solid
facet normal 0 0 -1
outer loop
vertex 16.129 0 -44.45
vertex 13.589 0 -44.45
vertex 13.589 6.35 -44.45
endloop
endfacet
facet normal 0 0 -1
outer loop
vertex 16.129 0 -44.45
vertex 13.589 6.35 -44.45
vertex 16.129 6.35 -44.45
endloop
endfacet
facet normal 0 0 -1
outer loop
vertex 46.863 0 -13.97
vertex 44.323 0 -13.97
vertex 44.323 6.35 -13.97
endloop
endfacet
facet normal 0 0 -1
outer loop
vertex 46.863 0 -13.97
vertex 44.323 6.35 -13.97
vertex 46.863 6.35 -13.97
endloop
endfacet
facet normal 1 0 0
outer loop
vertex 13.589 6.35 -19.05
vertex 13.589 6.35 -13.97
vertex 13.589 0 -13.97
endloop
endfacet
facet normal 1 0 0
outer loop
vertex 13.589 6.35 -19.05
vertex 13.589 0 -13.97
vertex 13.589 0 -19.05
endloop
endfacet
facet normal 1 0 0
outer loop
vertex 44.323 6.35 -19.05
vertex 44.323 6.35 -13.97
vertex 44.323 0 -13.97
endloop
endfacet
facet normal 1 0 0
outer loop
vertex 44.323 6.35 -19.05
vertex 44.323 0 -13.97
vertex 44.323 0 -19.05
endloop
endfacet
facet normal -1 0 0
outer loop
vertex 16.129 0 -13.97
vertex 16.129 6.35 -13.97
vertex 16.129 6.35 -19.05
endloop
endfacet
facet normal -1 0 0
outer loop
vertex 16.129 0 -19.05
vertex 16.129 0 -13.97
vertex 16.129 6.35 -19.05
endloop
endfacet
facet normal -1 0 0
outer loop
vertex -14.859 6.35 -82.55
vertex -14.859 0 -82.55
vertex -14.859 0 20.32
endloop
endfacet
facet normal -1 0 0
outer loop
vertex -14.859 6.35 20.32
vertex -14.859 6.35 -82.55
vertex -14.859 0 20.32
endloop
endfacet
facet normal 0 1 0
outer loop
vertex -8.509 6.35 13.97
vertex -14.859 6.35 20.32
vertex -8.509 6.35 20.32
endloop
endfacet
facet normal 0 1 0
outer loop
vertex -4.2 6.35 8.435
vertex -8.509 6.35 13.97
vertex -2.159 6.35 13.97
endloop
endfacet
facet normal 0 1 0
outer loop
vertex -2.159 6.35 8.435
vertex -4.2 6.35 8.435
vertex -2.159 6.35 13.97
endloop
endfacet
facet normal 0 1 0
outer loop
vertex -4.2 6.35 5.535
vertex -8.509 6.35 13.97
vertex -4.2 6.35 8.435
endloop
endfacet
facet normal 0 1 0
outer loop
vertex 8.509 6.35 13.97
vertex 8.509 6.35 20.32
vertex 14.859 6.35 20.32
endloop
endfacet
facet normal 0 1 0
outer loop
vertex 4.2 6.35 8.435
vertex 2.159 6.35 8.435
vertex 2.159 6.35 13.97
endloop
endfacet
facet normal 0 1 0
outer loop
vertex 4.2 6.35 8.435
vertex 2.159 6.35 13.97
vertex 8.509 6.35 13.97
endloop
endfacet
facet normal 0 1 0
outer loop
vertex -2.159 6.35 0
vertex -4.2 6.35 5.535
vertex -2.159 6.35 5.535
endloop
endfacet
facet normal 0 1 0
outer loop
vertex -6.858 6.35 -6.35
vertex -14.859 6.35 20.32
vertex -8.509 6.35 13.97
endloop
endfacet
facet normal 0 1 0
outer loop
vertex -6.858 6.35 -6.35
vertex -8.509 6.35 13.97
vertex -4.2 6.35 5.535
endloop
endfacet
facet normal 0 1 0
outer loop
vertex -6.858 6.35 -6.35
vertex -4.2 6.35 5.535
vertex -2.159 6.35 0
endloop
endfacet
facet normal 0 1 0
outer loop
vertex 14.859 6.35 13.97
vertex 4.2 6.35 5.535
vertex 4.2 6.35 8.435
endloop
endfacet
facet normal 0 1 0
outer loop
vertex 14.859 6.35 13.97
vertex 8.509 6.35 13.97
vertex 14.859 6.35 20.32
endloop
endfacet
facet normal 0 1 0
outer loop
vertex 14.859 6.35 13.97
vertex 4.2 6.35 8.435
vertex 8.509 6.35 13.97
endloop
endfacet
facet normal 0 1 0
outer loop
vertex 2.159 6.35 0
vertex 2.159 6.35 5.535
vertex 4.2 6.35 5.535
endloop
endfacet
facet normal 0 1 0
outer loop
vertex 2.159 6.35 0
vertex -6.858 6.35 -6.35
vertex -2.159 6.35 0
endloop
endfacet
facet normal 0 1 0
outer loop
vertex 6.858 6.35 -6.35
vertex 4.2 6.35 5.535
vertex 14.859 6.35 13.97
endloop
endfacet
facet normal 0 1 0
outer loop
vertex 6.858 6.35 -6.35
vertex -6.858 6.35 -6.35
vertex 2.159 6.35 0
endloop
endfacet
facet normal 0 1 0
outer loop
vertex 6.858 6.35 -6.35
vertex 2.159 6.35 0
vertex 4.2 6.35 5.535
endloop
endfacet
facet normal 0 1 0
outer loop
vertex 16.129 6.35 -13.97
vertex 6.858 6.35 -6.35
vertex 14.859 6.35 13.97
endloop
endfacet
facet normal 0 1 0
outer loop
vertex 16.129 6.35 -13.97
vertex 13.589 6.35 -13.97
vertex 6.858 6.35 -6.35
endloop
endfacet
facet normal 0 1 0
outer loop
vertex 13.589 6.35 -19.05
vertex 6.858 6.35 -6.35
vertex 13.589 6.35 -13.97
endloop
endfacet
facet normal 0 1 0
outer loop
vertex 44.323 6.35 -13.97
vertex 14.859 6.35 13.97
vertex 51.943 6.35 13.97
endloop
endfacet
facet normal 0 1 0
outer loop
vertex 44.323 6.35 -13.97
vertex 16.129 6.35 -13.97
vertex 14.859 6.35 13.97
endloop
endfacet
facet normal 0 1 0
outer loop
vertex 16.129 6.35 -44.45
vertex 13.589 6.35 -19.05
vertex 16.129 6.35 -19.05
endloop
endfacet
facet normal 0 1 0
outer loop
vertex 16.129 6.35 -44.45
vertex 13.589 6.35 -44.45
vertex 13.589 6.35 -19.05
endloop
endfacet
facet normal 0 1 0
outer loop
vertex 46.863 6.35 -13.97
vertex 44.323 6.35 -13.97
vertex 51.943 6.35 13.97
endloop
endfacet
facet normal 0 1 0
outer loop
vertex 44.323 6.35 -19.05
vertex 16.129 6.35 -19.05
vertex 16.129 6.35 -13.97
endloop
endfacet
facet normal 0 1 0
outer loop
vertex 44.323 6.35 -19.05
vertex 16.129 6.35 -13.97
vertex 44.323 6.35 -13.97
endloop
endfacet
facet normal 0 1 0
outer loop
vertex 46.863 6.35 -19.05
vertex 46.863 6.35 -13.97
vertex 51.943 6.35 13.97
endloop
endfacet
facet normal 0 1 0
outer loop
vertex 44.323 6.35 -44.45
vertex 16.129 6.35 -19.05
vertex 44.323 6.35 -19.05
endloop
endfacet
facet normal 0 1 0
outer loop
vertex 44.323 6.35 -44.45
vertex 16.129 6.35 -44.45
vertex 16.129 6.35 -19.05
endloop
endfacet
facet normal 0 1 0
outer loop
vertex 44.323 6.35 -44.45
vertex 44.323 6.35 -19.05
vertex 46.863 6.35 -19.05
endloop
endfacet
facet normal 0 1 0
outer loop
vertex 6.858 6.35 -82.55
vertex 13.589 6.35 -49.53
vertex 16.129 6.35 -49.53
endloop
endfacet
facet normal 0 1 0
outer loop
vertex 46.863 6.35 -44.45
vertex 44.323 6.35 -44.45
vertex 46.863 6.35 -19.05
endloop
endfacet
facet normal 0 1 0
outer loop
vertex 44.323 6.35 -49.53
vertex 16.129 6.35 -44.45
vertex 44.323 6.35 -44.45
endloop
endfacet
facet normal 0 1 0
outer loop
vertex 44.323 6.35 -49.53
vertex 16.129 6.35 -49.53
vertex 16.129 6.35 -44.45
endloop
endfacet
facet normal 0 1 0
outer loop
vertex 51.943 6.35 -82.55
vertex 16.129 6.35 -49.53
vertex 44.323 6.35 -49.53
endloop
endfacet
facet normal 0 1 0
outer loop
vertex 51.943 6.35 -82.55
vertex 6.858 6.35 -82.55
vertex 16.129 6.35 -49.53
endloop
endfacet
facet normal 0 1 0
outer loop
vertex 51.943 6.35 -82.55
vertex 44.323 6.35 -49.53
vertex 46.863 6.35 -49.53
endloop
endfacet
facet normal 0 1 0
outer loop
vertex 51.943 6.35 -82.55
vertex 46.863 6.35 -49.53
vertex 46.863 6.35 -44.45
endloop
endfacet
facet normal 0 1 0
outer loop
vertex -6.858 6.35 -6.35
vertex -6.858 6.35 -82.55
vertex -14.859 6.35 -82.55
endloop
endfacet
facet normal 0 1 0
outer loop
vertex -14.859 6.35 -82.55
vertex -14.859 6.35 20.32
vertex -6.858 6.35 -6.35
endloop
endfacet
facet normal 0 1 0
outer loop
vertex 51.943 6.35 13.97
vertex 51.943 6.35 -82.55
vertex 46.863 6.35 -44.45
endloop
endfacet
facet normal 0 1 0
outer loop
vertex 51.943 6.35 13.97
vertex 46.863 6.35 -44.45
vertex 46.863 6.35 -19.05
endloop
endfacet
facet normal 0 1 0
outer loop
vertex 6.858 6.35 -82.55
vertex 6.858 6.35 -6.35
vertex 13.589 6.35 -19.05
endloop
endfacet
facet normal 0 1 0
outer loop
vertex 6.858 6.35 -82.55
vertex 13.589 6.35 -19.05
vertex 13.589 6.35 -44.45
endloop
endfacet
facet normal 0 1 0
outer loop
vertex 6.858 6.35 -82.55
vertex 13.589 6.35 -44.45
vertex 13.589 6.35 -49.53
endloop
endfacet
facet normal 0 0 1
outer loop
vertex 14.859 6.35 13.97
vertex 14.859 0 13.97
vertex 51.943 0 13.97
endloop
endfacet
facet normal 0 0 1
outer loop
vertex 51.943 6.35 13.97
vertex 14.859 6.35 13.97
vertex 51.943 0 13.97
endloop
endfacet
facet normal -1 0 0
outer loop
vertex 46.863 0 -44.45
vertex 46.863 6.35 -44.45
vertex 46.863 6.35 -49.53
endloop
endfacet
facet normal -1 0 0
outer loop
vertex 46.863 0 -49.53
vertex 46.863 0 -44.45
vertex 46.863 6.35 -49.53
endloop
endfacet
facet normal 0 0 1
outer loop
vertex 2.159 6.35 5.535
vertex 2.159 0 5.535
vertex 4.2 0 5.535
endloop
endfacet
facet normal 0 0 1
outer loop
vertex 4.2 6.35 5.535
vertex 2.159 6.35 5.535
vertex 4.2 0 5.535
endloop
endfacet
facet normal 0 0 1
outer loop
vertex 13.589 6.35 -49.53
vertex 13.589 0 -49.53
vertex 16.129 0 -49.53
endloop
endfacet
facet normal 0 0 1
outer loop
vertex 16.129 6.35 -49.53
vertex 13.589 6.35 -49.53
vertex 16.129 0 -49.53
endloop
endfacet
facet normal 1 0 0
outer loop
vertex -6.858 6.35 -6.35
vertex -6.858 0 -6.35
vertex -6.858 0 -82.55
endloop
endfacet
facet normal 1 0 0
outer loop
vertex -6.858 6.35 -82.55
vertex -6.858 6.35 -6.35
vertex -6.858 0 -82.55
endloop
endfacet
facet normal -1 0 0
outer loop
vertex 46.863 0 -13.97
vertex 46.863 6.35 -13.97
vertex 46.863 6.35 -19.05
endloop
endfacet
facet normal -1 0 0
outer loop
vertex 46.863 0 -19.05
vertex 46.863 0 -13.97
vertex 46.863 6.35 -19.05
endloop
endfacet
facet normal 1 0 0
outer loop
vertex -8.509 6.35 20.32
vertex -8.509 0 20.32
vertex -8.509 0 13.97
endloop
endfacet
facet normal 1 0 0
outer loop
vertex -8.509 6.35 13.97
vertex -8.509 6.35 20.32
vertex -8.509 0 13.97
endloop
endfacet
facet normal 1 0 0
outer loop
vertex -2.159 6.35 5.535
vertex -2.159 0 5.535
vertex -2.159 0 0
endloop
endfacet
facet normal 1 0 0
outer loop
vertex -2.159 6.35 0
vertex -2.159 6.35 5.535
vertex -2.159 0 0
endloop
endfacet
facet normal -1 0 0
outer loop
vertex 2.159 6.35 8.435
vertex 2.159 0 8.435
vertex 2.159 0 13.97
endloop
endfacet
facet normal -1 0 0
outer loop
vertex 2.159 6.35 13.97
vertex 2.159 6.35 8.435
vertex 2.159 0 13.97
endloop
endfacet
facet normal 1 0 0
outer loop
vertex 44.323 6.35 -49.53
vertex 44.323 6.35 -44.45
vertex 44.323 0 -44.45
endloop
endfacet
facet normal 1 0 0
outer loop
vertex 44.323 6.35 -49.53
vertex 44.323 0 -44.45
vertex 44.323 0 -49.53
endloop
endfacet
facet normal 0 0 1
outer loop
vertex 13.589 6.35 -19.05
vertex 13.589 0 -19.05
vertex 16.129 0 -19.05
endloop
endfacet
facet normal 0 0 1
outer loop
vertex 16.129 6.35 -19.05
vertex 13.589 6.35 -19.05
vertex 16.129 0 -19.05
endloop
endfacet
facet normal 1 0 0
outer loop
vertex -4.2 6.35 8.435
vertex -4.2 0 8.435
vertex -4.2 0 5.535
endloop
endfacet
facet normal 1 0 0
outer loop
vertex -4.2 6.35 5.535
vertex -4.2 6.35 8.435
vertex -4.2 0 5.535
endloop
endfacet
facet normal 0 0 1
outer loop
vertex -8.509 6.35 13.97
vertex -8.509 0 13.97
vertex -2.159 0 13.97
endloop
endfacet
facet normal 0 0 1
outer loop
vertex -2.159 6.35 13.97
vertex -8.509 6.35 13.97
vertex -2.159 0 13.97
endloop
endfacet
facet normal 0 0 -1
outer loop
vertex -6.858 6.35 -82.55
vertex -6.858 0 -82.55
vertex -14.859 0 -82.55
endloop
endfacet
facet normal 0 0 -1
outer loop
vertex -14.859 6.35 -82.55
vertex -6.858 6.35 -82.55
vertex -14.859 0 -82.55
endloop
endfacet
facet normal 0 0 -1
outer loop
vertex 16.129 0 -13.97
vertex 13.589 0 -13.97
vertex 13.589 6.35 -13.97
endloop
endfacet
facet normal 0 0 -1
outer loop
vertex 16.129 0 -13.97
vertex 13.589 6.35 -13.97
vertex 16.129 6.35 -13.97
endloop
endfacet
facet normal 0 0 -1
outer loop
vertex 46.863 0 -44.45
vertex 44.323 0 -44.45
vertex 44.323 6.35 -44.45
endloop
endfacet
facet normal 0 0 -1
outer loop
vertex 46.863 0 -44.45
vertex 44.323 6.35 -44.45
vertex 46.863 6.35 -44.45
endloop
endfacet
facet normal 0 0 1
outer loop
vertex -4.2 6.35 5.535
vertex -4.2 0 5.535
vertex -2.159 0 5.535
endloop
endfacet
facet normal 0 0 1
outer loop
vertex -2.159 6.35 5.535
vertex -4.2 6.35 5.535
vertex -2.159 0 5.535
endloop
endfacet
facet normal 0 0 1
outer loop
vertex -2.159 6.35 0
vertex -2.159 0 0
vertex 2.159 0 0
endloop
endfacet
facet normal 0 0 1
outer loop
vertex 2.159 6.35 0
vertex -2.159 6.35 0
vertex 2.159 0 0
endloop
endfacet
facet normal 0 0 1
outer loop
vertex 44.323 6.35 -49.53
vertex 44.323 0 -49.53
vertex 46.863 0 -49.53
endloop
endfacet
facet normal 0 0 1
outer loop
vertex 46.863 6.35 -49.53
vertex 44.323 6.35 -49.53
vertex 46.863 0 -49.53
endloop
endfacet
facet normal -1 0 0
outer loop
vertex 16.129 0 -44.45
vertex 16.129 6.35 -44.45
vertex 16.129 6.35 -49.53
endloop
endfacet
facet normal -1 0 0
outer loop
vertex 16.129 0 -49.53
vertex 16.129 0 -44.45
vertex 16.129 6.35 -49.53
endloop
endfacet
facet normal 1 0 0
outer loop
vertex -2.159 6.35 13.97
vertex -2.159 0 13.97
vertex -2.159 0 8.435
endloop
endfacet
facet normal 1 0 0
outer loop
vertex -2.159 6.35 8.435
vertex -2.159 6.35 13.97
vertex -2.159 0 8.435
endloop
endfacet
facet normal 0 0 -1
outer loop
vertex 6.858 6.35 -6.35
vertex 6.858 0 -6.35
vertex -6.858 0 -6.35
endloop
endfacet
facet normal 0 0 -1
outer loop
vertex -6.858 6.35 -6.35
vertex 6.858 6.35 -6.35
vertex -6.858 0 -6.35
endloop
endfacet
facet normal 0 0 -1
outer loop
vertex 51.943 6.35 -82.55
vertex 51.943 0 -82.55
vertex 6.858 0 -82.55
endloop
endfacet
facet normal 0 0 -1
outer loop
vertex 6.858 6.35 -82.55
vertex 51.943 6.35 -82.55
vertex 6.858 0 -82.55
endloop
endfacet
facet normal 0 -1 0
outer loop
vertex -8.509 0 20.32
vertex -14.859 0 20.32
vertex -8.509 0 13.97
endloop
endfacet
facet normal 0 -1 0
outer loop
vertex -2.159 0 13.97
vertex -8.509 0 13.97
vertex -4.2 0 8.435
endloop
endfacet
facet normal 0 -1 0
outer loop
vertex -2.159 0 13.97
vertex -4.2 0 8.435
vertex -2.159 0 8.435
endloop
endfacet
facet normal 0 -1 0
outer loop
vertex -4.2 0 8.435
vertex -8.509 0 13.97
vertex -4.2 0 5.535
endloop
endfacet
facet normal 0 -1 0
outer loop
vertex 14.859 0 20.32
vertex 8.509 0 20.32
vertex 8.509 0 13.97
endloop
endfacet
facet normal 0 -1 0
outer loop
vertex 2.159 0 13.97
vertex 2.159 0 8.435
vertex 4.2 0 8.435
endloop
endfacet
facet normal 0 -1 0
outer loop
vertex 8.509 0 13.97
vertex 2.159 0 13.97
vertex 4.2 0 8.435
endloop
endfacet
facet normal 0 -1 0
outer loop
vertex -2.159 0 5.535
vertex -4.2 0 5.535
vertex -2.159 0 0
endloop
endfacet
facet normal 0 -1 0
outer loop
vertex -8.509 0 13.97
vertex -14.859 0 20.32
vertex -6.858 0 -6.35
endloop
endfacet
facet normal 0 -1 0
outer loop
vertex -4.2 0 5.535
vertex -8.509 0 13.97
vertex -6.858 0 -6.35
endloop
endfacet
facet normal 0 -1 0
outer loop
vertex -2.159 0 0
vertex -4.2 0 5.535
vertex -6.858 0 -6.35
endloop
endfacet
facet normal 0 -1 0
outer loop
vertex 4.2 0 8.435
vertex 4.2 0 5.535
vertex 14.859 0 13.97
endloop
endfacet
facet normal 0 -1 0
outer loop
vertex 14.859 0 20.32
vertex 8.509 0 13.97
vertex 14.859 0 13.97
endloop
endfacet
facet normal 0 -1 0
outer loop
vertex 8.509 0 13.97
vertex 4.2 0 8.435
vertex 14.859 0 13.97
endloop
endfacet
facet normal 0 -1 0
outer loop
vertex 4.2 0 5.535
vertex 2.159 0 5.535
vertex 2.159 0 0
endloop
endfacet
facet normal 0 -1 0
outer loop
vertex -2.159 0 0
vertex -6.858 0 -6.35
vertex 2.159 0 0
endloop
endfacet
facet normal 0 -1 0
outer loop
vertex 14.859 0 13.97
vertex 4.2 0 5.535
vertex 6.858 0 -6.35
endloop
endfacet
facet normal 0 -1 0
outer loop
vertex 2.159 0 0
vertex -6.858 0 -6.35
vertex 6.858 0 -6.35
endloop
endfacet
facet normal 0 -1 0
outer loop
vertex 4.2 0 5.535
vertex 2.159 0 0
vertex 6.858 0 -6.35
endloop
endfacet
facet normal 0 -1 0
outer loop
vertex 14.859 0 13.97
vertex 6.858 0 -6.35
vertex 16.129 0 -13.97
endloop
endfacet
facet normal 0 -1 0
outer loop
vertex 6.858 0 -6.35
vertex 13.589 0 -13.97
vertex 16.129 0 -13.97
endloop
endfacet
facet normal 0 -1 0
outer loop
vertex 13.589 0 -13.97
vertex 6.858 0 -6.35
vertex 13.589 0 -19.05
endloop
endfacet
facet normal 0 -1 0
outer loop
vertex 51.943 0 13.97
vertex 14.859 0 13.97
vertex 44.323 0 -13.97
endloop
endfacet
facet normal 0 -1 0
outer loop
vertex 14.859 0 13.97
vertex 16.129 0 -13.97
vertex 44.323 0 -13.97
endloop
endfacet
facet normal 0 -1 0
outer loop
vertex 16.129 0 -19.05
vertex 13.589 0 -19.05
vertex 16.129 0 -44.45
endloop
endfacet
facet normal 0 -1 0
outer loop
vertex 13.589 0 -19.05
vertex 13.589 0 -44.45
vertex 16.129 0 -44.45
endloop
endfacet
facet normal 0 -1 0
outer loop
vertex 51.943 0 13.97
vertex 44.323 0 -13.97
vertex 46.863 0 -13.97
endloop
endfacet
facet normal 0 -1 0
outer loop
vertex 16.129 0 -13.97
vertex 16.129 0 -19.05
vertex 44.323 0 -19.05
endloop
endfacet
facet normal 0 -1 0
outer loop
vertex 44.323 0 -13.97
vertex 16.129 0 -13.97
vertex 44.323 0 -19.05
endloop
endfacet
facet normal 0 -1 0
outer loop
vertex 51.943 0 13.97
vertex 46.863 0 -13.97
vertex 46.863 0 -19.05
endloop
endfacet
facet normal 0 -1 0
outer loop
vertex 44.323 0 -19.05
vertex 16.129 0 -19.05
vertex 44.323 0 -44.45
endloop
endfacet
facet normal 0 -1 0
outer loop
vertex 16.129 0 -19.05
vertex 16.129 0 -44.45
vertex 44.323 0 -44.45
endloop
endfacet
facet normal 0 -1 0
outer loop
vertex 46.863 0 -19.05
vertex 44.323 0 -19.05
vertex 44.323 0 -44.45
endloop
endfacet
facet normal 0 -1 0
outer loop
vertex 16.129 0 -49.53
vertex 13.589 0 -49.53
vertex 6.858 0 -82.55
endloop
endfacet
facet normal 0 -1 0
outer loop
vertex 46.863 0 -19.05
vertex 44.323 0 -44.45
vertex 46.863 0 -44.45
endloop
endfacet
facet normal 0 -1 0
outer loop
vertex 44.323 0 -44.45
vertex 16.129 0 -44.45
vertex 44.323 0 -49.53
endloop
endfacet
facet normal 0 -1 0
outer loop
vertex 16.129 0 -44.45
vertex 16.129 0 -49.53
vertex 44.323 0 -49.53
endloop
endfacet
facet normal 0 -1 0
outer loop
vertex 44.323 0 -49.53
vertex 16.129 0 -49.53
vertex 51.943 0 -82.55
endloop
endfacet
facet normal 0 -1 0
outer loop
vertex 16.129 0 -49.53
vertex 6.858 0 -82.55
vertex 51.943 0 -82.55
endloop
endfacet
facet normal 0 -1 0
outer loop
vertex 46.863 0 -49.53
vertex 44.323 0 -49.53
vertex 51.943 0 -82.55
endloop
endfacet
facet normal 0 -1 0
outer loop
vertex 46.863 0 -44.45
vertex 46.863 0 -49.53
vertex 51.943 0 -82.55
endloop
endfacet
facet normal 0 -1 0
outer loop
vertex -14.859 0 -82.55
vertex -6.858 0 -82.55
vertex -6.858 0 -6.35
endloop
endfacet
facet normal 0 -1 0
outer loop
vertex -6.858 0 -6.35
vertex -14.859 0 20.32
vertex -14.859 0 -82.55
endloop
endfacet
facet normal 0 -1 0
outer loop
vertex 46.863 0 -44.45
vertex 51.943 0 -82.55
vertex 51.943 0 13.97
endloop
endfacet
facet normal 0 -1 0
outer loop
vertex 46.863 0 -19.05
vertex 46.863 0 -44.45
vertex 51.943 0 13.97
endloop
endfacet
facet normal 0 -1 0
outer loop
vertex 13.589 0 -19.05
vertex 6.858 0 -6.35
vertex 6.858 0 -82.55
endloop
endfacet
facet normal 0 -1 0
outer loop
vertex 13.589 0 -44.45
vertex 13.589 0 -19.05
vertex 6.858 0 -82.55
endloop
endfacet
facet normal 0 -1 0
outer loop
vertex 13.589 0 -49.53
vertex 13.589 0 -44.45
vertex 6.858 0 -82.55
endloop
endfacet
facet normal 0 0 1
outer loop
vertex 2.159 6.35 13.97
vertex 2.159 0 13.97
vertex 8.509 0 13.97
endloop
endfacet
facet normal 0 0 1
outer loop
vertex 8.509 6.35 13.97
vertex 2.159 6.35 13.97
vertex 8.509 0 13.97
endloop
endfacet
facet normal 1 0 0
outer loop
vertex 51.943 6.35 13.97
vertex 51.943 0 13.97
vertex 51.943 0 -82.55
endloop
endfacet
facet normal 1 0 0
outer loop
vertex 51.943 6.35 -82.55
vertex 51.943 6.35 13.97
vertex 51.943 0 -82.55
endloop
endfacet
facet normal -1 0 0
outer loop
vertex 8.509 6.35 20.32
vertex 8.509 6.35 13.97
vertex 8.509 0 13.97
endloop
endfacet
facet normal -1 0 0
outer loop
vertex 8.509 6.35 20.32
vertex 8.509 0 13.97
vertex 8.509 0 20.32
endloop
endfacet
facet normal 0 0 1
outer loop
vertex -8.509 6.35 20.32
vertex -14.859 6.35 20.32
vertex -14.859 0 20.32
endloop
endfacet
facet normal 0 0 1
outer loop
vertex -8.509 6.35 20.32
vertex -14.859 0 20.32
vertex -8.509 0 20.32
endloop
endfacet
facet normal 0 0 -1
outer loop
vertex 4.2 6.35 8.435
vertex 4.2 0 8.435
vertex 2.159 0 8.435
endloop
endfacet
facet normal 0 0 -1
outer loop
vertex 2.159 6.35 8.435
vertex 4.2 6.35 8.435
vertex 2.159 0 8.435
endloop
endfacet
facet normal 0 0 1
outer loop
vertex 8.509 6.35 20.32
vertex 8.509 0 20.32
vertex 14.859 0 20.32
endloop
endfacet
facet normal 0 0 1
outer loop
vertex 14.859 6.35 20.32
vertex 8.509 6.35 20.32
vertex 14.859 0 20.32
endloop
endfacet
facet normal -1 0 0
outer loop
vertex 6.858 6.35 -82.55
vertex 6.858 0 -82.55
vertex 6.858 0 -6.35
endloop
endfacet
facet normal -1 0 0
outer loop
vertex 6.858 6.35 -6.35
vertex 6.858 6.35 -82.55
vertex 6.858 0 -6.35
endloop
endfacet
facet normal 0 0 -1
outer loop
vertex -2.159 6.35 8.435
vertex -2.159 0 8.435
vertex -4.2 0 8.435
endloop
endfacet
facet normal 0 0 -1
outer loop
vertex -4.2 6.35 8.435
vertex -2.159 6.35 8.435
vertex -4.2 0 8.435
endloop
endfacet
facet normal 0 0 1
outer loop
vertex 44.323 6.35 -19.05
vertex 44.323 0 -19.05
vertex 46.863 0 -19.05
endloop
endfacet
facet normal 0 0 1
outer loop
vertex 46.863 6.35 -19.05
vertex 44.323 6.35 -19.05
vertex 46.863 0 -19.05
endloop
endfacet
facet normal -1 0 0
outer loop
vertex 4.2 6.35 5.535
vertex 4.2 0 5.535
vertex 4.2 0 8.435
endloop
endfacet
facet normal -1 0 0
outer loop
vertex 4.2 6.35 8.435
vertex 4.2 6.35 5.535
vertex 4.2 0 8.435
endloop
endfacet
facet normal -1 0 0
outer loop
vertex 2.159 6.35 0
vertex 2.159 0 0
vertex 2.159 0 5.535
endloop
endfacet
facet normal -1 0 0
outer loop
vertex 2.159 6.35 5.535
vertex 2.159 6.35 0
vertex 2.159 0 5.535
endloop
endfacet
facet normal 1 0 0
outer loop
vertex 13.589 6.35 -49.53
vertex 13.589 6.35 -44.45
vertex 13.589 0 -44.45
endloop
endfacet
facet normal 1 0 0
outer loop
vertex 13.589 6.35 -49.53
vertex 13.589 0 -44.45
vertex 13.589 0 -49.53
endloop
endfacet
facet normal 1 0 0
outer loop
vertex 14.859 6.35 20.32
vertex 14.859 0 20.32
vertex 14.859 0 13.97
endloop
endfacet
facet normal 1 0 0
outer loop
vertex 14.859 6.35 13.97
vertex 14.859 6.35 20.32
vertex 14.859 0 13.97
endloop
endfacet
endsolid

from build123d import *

# Parameters (mm, degrees)
SKETCH1_W           = 2.54
SKETCH1_H           = 5.08
BOSS_EXTRUDE1_DEPTH = 6.35


with BuildPart() as part:
    # Sketch1 → Boss-Extrude1 (new body)
    with BuildSketch(Plane(origin=(0, 0, 0), x_dir=(1, 0, 0), z_dir=(0, 1, 0))):
        Polygon((-6.858, 6.35), (-6.858, 82.55), (-14.859, 82.55), (-14.859, -13.97), (-14.859, -20.32), (-8.509, -20.32), (-8.509, -13.97), (-2.159, -13.97), (-2.159, -8.435000021), (-4.199999982, -8.435000021), (-4.199999982, -5.534999979), (-2.159, -5.534999979), (-2.159, 0), (2.159, 0), (2.159, -5.534999979), (4.199999982, -5.534999979), (4.199999982, -8.435000021), (2.159, -8.435000021), (2.159, -13.97), (8.509, -13.97), (8.509, -20.32), (14.859, -20.32), (14.859, -13.97), (45.593, -13.97), (51.943, -13.97), (51.943, 82.55), (45.593, 82.55), (14.859, 82.55), (6.858, 82.55), (6.858, 6.35), align=None)
        with Locations((14.859, 16.51)):
            Rectangle(SKETCH1_W, SKETCH1_H, mode=Mode.SUBTRACT)
        with Locations((45.593, 16.51)):
            Rectangle(SKETCH1_W, SKETCH1_H, mode=Mode.SUBTRACT)
        with Locations((14.859, 46.99)):
            Rectangle(SKETCH1_W, SKETCH1_H, mode=Mode.SUBTRACT)
        with Locations((45.593, 46.99)):
            Rectangle(SKETCH1_W, SKETCH1_H, mode=Mode.SUBTRACT)
    extrude(amount=BOSS_EXTRUDE1_DEPTH)


solid = part.part
